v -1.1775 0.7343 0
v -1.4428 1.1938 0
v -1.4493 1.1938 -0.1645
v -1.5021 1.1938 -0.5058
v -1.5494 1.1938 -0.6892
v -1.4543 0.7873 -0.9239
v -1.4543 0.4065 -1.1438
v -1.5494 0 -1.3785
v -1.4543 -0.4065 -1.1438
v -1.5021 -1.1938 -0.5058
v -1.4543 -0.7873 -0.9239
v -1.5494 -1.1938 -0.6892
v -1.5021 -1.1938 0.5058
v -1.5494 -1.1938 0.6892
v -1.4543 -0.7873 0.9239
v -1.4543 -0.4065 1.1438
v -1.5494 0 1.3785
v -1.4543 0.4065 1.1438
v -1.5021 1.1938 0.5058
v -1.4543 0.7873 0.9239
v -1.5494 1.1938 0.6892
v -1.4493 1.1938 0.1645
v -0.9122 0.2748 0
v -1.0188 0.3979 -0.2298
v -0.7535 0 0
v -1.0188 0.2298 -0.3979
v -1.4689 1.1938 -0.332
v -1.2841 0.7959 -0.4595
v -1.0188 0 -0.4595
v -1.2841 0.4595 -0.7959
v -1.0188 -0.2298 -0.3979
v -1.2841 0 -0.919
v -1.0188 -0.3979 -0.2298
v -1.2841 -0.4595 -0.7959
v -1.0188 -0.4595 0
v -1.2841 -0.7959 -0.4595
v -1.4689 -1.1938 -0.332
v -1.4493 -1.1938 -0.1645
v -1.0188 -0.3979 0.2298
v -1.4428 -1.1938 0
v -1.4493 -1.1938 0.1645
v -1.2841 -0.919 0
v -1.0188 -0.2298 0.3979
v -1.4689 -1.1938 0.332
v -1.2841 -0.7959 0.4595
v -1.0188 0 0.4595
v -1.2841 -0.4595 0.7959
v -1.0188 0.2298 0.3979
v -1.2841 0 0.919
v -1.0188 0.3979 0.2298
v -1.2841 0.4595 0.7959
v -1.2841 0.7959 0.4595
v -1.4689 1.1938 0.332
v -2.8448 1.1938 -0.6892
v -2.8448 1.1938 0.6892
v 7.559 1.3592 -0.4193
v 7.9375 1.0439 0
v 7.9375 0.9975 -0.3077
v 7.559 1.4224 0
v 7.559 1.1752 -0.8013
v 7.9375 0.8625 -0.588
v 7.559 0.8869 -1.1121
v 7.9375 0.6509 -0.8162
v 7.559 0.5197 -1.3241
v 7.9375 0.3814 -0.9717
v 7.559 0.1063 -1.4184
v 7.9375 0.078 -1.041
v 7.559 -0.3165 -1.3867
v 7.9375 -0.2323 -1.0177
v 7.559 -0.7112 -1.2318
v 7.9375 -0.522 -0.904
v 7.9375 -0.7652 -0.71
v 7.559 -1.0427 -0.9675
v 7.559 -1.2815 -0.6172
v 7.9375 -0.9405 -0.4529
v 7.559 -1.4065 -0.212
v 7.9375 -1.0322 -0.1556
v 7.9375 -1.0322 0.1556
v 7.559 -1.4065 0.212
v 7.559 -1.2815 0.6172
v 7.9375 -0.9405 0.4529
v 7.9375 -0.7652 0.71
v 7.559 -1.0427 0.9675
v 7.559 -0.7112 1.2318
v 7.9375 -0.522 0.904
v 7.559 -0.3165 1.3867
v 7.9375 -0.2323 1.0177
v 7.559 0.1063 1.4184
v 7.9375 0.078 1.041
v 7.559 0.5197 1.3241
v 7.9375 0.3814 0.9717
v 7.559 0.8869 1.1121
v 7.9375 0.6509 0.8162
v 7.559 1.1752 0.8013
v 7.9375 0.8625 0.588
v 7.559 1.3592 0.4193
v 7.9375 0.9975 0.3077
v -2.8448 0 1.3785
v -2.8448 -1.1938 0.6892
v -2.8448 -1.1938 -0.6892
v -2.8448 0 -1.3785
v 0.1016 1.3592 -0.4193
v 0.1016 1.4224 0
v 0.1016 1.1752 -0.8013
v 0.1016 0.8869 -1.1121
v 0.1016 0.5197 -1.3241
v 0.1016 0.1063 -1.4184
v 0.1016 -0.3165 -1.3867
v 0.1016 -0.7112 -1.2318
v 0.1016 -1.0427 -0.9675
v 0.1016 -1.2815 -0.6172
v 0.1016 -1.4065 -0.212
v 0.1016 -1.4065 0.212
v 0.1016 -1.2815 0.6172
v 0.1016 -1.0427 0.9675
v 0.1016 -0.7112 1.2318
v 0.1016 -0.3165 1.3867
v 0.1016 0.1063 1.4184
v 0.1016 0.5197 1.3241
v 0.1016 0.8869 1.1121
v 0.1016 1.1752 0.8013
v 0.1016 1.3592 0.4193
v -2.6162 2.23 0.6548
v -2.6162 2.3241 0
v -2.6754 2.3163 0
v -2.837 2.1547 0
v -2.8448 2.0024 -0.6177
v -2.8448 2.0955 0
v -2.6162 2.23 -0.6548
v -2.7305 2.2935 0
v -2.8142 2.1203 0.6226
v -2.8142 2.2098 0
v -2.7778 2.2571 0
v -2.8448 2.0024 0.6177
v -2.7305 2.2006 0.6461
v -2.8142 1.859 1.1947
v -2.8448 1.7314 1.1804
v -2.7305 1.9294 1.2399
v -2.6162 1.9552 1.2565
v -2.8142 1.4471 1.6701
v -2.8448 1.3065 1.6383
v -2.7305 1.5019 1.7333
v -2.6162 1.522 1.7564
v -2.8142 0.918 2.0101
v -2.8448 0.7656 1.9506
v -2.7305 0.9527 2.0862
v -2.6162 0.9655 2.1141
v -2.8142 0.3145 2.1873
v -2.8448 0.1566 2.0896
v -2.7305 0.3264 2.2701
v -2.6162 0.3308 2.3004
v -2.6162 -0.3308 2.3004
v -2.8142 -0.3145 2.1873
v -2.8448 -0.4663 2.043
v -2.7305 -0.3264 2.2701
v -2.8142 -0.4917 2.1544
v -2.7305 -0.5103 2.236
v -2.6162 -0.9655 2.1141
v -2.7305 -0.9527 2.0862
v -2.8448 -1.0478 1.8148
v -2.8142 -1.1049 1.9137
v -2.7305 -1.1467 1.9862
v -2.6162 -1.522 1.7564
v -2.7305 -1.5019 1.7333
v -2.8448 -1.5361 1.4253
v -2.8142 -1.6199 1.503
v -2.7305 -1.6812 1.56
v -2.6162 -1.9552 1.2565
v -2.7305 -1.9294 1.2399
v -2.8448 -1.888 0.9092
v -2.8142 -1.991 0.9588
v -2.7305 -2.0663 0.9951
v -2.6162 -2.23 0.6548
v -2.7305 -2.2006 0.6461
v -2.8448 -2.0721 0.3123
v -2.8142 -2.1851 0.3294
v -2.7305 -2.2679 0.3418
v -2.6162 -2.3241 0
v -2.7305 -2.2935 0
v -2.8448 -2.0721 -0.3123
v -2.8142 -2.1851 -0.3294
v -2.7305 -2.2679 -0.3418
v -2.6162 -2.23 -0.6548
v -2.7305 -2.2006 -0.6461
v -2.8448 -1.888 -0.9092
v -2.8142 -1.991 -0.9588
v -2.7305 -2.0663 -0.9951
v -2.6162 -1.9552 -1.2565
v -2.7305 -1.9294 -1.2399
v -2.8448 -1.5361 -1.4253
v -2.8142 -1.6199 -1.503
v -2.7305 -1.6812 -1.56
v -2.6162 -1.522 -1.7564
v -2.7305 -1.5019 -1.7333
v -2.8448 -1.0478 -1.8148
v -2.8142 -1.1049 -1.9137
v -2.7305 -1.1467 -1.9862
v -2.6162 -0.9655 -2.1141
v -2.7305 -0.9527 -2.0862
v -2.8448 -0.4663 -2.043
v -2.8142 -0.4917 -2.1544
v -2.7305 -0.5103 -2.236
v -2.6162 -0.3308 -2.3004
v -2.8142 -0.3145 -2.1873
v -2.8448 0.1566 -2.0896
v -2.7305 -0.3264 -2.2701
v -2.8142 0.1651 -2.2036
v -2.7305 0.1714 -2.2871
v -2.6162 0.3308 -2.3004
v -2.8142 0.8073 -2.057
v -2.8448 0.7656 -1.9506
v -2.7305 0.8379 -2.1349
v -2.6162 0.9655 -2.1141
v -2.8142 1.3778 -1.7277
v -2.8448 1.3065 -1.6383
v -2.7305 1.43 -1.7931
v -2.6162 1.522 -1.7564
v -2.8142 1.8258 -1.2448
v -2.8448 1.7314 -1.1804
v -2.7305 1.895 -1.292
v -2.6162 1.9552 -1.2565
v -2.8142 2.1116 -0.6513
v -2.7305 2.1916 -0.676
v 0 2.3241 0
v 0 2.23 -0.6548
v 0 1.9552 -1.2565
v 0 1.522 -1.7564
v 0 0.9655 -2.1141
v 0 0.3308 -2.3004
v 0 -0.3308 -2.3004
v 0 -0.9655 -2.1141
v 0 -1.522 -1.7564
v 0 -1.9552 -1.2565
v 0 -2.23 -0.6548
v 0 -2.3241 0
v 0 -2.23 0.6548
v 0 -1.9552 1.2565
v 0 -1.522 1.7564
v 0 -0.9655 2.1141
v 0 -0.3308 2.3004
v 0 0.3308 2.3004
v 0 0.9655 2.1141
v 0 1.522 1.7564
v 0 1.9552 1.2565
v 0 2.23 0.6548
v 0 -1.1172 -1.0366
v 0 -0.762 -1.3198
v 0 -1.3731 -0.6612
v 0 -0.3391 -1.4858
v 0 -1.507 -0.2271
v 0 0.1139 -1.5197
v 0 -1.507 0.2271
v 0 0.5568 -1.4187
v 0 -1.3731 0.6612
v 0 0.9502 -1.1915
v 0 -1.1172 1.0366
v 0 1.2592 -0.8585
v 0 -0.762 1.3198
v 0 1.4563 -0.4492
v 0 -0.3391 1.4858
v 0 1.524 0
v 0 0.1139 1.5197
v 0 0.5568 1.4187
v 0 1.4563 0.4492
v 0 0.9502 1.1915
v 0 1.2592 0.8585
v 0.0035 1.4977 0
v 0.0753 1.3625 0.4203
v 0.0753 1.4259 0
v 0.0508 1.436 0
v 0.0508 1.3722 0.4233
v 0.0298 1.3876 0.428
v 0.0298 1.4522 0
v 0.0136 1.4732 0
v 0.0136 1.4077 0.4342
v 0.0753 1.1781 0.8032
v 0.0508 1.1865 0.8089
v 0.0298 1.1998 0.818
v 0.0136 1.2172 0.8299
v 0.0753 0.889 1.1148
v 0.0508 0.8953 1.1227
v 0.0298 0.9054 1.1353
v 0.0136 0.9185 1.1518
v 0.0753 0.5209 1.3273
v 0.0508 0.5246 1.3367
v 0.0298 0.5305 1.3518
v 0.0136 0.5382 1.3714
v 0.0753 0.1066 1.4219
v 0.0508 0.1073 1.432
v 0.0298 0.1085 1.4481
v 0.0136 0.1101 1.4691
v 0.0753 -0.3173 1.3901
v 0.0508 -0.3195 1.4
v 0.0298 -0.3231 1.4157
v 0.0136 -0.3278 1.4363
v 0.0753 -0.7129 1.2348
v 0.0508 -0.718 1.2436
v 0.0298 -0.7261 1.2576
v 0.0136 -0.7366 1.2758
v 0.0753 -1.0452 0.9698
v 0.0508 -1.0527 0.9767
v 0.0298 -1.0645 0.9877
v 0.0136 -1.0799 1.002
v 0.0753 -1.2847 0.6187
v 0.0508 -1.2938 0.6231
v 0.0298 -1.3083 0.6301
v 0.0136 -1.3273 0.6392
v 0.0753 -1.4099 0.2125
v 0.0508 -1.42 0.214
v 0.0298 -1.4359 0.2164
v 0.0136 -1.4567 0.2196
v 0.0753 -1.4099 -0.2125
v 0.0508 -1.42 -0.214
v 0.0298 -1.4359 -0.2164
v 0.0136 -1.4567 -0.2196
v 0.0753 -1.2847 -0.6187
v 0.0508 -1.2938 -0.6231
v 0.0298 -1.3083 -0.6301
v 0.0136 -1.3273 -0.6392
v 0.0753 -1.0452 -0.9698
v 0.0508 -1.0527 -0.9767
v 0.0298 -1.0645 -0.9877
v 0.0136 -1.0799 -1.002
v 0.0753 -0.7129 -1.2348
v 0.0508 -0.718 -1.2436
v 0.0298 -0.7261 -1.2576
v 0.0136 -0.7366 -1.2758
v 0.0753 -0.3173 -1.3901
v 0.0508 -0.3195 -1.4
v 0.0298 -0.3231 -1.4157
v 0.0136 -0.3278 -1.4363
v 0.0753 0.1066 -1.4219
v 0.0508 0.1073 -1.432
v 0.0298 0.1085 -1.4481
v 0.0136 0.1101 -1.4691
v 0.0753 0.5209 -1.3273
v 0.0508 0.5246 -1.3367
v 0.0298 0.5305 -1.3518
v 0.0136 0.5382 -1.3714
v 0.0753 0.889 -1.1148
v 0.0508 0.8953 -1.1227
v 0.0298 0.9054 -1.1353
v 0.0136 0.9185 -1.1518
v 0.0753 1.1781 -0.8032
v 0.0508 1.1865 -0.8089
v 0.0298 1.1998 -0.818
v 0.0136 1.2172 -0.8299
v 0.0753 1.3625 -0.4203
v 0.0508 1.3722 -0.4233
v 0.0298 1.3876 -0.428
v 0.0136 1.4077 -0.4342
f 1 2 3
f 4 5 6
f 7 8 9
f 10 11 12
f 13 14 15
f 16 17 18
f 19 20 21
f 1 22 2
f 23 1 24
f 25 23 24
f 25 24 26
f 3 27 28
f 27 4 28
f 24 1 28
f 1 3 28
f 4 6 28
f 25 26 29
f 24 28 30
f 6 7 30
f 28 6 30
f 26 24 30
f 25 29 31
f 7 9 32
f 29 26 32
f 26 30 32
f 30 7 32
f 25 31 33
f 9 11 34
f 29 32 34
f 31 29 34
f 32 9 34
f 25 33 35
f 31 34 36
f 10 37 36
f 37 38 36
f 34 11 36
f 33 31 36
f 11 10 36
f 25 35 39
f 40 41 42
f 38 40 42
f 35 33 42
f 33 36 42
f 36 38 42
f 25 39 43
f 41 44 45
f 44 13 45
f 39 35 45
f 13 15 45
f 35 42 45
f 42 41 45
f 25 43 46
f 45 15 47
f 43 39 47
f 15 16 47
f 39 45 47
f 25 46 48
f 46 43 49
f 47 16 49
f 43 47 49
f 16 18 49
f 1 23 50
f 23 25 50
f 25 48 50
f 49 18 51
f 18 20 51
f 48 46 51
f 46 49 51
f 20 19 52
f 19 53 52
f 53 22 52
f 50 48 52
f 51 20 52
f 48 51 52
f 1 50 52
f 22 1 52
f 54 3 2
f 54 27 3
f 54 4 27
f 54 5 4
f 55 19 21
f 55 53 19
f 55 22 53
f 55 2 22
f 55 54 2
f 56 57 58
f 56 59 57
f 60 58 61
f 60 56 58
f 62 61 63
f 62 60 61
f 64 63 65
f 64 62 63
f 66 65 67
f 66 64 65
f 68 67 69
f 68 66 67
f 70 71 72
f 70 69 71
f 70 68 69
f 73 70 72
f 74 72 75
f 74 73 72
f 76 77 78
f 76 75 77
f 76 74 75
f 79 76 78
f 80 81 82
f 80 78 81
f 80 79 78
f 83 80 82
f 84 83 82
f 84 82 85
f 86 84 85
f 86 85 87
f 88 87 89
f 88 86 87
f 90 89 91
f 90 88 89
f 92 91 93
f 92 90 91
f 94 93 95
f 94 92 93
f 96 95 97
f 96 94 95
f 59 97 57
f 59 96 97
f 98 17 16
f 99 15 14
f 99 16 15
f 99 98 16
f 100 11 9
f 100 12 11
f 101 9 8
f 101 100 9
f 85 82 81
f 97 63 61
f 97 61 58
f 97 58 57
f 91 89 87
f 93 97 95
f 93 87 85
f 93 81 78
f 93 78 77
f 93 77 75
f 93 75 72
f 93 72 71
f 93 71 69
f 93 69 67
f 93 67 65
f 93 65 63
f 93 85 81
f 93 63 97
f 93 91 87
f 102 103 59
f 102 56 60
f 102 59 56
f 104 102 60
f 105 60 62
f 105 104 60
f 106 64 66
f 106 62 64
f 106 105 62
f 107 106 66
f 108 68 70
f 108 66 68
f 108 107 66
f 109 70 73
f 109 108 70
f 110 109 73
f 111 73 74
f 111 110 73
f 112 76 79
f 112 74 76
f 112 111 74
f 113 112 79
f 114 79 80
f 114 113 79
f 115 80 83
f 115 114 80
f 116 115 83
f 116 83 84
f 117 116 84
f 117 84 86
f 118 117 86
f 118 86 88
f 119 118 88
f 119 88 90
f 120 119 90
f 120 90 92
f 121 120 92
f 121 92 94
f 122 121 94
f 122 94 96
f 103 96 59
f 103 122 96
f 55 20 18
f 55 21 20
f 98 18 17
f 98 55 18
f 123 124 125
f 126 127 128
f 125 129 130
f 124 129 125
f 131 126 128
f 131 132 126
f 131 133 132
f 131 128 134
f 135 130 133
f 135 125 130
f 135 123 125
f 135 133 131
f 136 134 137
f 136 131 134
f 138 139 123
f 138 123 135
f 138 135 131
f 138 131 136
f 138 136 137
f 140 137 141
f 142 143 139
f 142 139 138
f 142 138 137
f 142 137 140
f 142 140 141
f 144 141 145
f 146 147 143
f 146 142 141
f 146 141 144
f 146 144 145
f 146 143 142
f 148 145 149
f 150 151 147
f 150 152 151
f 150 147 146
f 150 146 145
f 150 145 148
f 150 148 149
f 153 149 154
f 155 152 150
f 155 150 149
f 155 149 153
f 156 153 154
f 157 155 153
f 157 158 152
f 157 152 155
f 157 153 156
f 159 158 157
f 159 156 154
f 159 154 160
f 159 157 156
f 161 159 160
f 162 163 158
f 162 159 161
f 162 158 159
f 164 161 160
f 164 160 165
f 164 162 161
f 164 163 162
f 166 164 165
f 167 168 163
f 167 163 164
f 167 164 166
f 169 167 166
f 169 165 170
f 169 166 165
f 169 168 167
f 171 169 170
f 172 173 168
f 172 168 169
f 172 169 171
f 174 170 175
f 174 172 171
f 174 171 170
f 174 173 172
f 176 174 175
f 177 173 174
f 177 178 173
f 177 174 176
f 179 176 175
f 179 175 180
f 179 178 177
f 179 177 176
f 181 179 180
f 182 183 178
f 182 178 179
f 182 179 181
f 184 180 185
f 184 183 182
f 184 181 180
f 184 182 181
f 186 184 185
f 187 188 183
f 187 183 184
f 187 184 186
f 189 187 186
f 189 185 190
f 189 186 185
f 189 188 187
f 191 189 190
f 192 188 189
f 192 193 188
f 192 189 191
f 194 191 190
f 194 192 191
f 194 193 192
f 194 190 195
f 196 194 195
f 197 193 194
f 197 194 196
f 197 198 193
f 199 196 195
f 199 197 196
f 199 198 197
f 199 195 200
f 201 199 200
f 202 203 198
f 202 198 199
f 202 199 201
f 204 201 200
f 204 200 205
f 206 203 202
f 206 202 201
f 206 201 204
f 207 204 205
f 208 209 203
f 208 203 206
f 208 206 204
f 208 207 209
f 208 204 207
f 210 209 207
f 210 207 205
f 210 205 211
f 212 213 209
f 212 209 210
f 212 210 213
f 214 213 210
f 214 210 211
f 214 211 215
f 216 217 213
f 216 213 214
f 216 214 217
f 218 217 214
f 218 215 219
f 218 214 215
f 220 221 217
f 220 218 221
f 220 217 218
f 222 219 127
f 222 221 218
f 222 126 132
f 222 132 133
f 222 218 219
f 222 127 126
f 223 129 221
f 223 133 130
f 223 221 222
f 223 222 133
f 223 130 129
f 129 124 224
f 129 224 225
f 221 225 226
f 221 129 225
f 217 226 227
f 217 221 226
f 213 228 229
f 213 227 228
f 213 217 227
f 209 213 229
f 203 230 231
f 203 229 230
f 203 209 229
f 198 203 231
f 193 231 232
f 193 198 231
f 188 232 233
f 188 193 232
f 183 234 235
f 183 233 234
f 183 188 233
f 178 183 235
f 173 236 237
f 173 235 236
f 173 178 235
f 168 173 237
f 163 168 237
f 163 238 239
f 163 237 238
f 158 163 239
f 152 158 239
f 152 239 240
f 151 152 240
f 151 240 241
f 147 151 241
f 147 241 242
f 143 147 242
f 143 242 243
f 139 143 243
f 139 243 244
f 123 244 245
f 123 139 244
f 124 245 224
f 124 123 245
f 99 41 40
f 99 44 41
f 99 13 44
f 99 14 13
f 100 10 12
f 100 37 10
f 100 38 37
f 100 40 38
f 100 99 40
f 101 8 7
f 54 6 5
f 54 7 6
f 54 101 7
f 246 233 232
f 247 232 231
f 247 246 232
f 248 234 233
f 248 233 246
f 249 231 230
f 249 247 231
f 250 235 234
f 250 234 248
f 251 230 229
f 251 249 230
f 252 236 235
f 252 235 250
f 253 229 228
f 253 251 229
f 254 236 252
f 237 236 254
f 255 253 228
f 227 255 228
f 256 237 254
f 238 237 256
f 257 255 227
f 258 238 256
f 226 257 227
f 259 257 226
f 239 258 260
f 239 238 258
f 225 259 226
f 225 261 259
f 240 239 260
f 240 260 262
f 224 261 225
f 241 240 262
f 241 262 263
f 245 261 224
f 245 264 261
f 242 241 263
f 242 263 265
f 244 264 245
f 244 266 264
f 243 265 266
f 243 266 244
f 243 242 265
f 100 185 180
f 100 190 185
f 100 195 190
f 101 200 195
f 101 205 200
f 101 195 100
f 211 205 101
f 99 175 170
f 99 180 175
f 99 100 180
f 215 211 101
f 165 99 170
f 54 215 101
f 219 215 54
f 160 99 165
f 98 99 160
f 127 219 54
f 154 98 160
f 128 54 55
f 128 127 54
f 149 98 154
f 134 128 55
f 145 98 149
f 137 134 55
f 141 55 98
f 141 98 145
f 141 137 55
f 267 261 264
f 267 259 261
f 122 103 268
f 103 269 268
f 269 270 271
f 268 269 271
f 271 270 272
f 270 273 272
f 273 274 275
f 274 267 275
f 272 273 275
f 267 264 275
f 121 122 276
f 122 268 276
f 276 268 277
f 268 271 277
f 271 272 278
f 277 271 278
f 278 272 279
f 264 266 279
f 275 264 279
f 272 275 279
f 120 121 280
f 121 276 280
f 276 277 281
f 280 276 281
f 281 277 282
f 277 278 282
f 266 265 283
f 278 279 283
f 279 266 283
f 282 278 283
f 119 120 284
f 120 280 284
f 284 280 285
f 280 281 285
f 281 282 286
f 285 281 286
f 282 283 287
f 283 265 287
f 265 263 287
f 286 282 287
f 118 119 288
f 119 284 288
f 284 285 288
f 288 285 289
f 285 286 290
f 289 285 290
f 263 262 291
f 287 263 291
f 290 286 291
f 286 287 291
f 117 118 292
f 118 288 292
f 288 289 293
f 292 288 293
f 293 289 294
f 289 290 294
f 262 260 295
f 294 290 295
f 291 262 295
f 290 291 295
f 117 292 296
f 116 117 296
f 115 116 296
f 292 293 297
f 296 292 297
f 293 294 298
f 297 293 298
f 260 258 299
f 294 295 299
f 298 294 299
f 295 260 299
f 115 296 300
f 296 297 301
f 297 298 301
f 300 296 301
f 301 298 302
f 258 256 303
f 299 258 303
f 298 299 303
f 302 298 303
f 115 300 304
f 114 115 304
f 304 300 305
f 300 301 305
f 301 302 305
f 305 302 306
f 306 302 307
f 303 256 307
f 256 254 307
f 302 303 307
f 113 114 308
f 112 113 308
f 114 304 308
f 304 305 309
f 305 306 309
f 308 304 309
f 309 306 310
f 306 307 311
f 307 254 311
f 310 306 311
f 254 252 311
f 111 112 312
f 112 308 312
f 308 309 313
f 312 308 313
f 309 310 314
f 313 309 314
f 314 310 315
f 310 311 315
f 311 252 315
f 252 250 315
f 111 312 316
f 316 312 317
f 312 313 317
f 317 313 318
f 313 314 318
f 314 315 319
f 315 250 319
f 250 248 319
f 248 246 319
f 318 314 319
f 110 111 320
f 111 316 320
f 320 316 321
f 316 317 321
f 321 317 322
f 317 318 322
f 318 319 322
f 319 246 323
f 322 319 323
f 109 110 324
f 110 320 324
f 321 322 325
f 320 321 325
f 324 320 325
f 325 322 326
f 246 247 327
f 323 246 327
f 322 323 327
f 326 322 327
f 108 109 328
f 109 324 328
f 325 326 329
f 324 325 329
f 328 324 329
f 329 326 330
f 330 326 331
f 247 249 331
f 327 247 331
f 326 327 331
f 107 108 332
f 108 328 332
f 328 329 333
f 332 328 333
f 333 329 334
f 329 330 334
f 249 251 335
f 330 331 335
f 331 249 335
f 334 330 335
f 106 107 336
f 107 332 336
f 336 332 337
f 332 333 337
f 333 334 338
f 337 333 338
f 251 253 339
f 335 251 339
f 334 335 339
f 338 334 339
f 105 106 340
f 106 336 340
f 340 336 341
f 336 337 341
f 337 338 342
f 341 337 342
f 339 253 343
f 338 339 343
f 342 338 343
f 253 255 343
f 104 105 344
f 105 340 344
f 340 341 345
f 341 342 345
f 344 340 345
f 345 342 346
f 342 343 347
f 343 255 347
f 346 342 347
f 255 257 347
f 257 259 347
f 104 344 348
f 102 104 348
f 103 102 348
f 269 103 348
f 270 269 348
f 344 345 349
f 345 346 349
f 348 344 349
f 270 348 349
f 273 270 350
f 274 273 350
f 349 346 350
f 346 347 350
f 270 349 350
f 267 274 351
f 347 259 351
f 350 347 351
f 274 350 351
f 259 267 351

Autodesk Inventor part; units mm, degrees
ref_plane "YZ Plane" through (0, 0, 0) normal (1, 0, 0) x (0, 1, 0)
ref_plane "XZ Plane" through (0, 0, 0) normal (0, 1, 0) x (-1, 0, 0)
sketch "Sketch1" plane through (0, 0, 0) normal (0, 0, 1) x (1, 0, 0)
  line L0 (-0.7535, 0) -> (7.9375, 0)
  line L1 (7.9375, 0) -> (7.9375, 1.4224)
  line L2 (7.9375, 1.4224) -> (2.4448, 1.4224)
  line L3 (2.4448, 1.4224) -> (0.8572, 1.4224)
  line L4 (0.8572, 1.4224) -> (0, 1.4224)
  line L5 (0, 1.4224) -> (0, 2.3241)
  line L6 (0, 2.3241) -> (-2.8448, 2.3241)
  line L7 (-2.8448, 2.3241) -> (-2.8448, 1.3785)
  line L8 (-2.8448, 1.3785) -> (-1.5494, 1.3785)
  line L9 (-1.5494, 1.3785) -> (-0.7535, 0)
  line L10 (-5.0013, 0) -> (10.094, 0) projected
  line L11 (0, -0.4648) -> (0, 2.7889) projected
  line L12 (2.4448, 1.4224) -> (0, 1.4224) construction
  dimension "d1" = 5.4928
  dimension "d2" = 1.5876
  dimension "d3" = 2.8448
  dimension "d4" = 1.2954
  dimension "d5" = 60
  dimension "d6" = 2.8448
  dimension "d7" = 2.8448
  dimension "d8" = 2.757
  dimension "d9" = 4.6482
  dimension "d26" = 7.9375
revolve "Body" add sketch "Sketch1" angle 360 about axis through (-0.7535, 0, 0) along (1, 0, 0)
sketch "Sketch2" plane through (-2.8448, 0, 0) normal (-1, 0, 0) x (0, 0, 1)
  circle A0 centre (0, 0) radius 1.3785 projected
  line L0 (0, -3.2537) -> (0, 3.2537) projected
  line L1 (-3.2537, 0) -> (3.2537, 0) projected
  line L2 (1.3785, 0) -> (0.6892, -1.1938)
  line L3 (0.6892, -1.1938) -> (-0.6892, -1.1938)
  line L4 (-0.6892, -1.1938) -> (-1.3785, 0)
  line L5 (-1.3785, 0) -> (-0.6892, 1.1938)
  line L6 (-0.6892, 1.1938) -> (0.6892, 1.1938)
  line L7 (0.6892, 1.1938) -> (1.3785, 0)
  point P0 (0, 0)
extrude "Slot" add sketch "Sketch2" against normal up to next contours L7 A0 | A0 L2 | L6 L0 A0 | A0 L0 L3 | L0 L6 A0 | A0 L3 L0 | L4 A0 | A0 L5
fillet "Fillet1" radius 0.2286 1 edges at (-2.8448, -2.3241, 0)
thread "Thread" size "4-40 UNC" class "2A" standard "ANSI Unified Screw Threads" length 5.4927
chamfer "Chamfer1" distance 0.3785 distance2 0.3785 1 edges at (7.9375, -1.4224, 0) measured on face at (7.9375, -0.3549, 0.3144)
ref_plane "Work Plane1" through (29, 0, 0) normal (0, -1, 0) x (1, 0, 0)
fillet "Fillet2" radius 0.1016 1 edges at (0, -1.4224, 0)
equation "\"d1\" = GEL"
equation "\"d3\" = KOH"
equation "\"d4\" = INTI"
equation "\"d6\" = GD"
equation "\"d7\" = BDM"
equation "\"d8\" = 1.1547 * SW"
equation "\"d9\" = KOD"
equation "\"d26\" = NLG"
equation "\"d30\" = R"
equation "\"d17\" = RR"
equation "\"d13\" = GEL"
equation "\"d15\" = -0.5 * SPD + 0.5 * GD"
equation "\"d16\" = GUL"
equation "\"GD\" = 2.8448"
equation "\"NLG\" = 7.9375"
equation "\"GEL\" = 5.49275"
equation "\"KOD\" = 4.6482"
equation "\"KOH\" = 2.8448"
equation "\"INTI\" = 1.2954"
equation "\"GAL\" = 1.5875"
equation "\"GUL\" = 0.37846"
equation "\"BDM\" = 2.8448"
equation "\"SW\" = 2.3876"
equation "\"RR\" = 0.2286"
equation "\"SPD\" = 2.08788"
equation "\"R\" = 0.1016"
equation "\"PHH\" = 0.127"
equation "\"GD1\" = SPD"
equation "\"THREADDIA\" = 2.8448"
equation "\"FAWI\" = 45deg"
equation "\"KOH1\" = 2.5654"
equation "\"NND\" = 2.8448"
equation "\"TOA\" = 30deg"
equation "\"E0\" = 1.155 * SW"
properties part number "ANSI B18.3 - No. 4 - 40 UNC - 5/16 HS HCS" material "Steel, Alloy"
